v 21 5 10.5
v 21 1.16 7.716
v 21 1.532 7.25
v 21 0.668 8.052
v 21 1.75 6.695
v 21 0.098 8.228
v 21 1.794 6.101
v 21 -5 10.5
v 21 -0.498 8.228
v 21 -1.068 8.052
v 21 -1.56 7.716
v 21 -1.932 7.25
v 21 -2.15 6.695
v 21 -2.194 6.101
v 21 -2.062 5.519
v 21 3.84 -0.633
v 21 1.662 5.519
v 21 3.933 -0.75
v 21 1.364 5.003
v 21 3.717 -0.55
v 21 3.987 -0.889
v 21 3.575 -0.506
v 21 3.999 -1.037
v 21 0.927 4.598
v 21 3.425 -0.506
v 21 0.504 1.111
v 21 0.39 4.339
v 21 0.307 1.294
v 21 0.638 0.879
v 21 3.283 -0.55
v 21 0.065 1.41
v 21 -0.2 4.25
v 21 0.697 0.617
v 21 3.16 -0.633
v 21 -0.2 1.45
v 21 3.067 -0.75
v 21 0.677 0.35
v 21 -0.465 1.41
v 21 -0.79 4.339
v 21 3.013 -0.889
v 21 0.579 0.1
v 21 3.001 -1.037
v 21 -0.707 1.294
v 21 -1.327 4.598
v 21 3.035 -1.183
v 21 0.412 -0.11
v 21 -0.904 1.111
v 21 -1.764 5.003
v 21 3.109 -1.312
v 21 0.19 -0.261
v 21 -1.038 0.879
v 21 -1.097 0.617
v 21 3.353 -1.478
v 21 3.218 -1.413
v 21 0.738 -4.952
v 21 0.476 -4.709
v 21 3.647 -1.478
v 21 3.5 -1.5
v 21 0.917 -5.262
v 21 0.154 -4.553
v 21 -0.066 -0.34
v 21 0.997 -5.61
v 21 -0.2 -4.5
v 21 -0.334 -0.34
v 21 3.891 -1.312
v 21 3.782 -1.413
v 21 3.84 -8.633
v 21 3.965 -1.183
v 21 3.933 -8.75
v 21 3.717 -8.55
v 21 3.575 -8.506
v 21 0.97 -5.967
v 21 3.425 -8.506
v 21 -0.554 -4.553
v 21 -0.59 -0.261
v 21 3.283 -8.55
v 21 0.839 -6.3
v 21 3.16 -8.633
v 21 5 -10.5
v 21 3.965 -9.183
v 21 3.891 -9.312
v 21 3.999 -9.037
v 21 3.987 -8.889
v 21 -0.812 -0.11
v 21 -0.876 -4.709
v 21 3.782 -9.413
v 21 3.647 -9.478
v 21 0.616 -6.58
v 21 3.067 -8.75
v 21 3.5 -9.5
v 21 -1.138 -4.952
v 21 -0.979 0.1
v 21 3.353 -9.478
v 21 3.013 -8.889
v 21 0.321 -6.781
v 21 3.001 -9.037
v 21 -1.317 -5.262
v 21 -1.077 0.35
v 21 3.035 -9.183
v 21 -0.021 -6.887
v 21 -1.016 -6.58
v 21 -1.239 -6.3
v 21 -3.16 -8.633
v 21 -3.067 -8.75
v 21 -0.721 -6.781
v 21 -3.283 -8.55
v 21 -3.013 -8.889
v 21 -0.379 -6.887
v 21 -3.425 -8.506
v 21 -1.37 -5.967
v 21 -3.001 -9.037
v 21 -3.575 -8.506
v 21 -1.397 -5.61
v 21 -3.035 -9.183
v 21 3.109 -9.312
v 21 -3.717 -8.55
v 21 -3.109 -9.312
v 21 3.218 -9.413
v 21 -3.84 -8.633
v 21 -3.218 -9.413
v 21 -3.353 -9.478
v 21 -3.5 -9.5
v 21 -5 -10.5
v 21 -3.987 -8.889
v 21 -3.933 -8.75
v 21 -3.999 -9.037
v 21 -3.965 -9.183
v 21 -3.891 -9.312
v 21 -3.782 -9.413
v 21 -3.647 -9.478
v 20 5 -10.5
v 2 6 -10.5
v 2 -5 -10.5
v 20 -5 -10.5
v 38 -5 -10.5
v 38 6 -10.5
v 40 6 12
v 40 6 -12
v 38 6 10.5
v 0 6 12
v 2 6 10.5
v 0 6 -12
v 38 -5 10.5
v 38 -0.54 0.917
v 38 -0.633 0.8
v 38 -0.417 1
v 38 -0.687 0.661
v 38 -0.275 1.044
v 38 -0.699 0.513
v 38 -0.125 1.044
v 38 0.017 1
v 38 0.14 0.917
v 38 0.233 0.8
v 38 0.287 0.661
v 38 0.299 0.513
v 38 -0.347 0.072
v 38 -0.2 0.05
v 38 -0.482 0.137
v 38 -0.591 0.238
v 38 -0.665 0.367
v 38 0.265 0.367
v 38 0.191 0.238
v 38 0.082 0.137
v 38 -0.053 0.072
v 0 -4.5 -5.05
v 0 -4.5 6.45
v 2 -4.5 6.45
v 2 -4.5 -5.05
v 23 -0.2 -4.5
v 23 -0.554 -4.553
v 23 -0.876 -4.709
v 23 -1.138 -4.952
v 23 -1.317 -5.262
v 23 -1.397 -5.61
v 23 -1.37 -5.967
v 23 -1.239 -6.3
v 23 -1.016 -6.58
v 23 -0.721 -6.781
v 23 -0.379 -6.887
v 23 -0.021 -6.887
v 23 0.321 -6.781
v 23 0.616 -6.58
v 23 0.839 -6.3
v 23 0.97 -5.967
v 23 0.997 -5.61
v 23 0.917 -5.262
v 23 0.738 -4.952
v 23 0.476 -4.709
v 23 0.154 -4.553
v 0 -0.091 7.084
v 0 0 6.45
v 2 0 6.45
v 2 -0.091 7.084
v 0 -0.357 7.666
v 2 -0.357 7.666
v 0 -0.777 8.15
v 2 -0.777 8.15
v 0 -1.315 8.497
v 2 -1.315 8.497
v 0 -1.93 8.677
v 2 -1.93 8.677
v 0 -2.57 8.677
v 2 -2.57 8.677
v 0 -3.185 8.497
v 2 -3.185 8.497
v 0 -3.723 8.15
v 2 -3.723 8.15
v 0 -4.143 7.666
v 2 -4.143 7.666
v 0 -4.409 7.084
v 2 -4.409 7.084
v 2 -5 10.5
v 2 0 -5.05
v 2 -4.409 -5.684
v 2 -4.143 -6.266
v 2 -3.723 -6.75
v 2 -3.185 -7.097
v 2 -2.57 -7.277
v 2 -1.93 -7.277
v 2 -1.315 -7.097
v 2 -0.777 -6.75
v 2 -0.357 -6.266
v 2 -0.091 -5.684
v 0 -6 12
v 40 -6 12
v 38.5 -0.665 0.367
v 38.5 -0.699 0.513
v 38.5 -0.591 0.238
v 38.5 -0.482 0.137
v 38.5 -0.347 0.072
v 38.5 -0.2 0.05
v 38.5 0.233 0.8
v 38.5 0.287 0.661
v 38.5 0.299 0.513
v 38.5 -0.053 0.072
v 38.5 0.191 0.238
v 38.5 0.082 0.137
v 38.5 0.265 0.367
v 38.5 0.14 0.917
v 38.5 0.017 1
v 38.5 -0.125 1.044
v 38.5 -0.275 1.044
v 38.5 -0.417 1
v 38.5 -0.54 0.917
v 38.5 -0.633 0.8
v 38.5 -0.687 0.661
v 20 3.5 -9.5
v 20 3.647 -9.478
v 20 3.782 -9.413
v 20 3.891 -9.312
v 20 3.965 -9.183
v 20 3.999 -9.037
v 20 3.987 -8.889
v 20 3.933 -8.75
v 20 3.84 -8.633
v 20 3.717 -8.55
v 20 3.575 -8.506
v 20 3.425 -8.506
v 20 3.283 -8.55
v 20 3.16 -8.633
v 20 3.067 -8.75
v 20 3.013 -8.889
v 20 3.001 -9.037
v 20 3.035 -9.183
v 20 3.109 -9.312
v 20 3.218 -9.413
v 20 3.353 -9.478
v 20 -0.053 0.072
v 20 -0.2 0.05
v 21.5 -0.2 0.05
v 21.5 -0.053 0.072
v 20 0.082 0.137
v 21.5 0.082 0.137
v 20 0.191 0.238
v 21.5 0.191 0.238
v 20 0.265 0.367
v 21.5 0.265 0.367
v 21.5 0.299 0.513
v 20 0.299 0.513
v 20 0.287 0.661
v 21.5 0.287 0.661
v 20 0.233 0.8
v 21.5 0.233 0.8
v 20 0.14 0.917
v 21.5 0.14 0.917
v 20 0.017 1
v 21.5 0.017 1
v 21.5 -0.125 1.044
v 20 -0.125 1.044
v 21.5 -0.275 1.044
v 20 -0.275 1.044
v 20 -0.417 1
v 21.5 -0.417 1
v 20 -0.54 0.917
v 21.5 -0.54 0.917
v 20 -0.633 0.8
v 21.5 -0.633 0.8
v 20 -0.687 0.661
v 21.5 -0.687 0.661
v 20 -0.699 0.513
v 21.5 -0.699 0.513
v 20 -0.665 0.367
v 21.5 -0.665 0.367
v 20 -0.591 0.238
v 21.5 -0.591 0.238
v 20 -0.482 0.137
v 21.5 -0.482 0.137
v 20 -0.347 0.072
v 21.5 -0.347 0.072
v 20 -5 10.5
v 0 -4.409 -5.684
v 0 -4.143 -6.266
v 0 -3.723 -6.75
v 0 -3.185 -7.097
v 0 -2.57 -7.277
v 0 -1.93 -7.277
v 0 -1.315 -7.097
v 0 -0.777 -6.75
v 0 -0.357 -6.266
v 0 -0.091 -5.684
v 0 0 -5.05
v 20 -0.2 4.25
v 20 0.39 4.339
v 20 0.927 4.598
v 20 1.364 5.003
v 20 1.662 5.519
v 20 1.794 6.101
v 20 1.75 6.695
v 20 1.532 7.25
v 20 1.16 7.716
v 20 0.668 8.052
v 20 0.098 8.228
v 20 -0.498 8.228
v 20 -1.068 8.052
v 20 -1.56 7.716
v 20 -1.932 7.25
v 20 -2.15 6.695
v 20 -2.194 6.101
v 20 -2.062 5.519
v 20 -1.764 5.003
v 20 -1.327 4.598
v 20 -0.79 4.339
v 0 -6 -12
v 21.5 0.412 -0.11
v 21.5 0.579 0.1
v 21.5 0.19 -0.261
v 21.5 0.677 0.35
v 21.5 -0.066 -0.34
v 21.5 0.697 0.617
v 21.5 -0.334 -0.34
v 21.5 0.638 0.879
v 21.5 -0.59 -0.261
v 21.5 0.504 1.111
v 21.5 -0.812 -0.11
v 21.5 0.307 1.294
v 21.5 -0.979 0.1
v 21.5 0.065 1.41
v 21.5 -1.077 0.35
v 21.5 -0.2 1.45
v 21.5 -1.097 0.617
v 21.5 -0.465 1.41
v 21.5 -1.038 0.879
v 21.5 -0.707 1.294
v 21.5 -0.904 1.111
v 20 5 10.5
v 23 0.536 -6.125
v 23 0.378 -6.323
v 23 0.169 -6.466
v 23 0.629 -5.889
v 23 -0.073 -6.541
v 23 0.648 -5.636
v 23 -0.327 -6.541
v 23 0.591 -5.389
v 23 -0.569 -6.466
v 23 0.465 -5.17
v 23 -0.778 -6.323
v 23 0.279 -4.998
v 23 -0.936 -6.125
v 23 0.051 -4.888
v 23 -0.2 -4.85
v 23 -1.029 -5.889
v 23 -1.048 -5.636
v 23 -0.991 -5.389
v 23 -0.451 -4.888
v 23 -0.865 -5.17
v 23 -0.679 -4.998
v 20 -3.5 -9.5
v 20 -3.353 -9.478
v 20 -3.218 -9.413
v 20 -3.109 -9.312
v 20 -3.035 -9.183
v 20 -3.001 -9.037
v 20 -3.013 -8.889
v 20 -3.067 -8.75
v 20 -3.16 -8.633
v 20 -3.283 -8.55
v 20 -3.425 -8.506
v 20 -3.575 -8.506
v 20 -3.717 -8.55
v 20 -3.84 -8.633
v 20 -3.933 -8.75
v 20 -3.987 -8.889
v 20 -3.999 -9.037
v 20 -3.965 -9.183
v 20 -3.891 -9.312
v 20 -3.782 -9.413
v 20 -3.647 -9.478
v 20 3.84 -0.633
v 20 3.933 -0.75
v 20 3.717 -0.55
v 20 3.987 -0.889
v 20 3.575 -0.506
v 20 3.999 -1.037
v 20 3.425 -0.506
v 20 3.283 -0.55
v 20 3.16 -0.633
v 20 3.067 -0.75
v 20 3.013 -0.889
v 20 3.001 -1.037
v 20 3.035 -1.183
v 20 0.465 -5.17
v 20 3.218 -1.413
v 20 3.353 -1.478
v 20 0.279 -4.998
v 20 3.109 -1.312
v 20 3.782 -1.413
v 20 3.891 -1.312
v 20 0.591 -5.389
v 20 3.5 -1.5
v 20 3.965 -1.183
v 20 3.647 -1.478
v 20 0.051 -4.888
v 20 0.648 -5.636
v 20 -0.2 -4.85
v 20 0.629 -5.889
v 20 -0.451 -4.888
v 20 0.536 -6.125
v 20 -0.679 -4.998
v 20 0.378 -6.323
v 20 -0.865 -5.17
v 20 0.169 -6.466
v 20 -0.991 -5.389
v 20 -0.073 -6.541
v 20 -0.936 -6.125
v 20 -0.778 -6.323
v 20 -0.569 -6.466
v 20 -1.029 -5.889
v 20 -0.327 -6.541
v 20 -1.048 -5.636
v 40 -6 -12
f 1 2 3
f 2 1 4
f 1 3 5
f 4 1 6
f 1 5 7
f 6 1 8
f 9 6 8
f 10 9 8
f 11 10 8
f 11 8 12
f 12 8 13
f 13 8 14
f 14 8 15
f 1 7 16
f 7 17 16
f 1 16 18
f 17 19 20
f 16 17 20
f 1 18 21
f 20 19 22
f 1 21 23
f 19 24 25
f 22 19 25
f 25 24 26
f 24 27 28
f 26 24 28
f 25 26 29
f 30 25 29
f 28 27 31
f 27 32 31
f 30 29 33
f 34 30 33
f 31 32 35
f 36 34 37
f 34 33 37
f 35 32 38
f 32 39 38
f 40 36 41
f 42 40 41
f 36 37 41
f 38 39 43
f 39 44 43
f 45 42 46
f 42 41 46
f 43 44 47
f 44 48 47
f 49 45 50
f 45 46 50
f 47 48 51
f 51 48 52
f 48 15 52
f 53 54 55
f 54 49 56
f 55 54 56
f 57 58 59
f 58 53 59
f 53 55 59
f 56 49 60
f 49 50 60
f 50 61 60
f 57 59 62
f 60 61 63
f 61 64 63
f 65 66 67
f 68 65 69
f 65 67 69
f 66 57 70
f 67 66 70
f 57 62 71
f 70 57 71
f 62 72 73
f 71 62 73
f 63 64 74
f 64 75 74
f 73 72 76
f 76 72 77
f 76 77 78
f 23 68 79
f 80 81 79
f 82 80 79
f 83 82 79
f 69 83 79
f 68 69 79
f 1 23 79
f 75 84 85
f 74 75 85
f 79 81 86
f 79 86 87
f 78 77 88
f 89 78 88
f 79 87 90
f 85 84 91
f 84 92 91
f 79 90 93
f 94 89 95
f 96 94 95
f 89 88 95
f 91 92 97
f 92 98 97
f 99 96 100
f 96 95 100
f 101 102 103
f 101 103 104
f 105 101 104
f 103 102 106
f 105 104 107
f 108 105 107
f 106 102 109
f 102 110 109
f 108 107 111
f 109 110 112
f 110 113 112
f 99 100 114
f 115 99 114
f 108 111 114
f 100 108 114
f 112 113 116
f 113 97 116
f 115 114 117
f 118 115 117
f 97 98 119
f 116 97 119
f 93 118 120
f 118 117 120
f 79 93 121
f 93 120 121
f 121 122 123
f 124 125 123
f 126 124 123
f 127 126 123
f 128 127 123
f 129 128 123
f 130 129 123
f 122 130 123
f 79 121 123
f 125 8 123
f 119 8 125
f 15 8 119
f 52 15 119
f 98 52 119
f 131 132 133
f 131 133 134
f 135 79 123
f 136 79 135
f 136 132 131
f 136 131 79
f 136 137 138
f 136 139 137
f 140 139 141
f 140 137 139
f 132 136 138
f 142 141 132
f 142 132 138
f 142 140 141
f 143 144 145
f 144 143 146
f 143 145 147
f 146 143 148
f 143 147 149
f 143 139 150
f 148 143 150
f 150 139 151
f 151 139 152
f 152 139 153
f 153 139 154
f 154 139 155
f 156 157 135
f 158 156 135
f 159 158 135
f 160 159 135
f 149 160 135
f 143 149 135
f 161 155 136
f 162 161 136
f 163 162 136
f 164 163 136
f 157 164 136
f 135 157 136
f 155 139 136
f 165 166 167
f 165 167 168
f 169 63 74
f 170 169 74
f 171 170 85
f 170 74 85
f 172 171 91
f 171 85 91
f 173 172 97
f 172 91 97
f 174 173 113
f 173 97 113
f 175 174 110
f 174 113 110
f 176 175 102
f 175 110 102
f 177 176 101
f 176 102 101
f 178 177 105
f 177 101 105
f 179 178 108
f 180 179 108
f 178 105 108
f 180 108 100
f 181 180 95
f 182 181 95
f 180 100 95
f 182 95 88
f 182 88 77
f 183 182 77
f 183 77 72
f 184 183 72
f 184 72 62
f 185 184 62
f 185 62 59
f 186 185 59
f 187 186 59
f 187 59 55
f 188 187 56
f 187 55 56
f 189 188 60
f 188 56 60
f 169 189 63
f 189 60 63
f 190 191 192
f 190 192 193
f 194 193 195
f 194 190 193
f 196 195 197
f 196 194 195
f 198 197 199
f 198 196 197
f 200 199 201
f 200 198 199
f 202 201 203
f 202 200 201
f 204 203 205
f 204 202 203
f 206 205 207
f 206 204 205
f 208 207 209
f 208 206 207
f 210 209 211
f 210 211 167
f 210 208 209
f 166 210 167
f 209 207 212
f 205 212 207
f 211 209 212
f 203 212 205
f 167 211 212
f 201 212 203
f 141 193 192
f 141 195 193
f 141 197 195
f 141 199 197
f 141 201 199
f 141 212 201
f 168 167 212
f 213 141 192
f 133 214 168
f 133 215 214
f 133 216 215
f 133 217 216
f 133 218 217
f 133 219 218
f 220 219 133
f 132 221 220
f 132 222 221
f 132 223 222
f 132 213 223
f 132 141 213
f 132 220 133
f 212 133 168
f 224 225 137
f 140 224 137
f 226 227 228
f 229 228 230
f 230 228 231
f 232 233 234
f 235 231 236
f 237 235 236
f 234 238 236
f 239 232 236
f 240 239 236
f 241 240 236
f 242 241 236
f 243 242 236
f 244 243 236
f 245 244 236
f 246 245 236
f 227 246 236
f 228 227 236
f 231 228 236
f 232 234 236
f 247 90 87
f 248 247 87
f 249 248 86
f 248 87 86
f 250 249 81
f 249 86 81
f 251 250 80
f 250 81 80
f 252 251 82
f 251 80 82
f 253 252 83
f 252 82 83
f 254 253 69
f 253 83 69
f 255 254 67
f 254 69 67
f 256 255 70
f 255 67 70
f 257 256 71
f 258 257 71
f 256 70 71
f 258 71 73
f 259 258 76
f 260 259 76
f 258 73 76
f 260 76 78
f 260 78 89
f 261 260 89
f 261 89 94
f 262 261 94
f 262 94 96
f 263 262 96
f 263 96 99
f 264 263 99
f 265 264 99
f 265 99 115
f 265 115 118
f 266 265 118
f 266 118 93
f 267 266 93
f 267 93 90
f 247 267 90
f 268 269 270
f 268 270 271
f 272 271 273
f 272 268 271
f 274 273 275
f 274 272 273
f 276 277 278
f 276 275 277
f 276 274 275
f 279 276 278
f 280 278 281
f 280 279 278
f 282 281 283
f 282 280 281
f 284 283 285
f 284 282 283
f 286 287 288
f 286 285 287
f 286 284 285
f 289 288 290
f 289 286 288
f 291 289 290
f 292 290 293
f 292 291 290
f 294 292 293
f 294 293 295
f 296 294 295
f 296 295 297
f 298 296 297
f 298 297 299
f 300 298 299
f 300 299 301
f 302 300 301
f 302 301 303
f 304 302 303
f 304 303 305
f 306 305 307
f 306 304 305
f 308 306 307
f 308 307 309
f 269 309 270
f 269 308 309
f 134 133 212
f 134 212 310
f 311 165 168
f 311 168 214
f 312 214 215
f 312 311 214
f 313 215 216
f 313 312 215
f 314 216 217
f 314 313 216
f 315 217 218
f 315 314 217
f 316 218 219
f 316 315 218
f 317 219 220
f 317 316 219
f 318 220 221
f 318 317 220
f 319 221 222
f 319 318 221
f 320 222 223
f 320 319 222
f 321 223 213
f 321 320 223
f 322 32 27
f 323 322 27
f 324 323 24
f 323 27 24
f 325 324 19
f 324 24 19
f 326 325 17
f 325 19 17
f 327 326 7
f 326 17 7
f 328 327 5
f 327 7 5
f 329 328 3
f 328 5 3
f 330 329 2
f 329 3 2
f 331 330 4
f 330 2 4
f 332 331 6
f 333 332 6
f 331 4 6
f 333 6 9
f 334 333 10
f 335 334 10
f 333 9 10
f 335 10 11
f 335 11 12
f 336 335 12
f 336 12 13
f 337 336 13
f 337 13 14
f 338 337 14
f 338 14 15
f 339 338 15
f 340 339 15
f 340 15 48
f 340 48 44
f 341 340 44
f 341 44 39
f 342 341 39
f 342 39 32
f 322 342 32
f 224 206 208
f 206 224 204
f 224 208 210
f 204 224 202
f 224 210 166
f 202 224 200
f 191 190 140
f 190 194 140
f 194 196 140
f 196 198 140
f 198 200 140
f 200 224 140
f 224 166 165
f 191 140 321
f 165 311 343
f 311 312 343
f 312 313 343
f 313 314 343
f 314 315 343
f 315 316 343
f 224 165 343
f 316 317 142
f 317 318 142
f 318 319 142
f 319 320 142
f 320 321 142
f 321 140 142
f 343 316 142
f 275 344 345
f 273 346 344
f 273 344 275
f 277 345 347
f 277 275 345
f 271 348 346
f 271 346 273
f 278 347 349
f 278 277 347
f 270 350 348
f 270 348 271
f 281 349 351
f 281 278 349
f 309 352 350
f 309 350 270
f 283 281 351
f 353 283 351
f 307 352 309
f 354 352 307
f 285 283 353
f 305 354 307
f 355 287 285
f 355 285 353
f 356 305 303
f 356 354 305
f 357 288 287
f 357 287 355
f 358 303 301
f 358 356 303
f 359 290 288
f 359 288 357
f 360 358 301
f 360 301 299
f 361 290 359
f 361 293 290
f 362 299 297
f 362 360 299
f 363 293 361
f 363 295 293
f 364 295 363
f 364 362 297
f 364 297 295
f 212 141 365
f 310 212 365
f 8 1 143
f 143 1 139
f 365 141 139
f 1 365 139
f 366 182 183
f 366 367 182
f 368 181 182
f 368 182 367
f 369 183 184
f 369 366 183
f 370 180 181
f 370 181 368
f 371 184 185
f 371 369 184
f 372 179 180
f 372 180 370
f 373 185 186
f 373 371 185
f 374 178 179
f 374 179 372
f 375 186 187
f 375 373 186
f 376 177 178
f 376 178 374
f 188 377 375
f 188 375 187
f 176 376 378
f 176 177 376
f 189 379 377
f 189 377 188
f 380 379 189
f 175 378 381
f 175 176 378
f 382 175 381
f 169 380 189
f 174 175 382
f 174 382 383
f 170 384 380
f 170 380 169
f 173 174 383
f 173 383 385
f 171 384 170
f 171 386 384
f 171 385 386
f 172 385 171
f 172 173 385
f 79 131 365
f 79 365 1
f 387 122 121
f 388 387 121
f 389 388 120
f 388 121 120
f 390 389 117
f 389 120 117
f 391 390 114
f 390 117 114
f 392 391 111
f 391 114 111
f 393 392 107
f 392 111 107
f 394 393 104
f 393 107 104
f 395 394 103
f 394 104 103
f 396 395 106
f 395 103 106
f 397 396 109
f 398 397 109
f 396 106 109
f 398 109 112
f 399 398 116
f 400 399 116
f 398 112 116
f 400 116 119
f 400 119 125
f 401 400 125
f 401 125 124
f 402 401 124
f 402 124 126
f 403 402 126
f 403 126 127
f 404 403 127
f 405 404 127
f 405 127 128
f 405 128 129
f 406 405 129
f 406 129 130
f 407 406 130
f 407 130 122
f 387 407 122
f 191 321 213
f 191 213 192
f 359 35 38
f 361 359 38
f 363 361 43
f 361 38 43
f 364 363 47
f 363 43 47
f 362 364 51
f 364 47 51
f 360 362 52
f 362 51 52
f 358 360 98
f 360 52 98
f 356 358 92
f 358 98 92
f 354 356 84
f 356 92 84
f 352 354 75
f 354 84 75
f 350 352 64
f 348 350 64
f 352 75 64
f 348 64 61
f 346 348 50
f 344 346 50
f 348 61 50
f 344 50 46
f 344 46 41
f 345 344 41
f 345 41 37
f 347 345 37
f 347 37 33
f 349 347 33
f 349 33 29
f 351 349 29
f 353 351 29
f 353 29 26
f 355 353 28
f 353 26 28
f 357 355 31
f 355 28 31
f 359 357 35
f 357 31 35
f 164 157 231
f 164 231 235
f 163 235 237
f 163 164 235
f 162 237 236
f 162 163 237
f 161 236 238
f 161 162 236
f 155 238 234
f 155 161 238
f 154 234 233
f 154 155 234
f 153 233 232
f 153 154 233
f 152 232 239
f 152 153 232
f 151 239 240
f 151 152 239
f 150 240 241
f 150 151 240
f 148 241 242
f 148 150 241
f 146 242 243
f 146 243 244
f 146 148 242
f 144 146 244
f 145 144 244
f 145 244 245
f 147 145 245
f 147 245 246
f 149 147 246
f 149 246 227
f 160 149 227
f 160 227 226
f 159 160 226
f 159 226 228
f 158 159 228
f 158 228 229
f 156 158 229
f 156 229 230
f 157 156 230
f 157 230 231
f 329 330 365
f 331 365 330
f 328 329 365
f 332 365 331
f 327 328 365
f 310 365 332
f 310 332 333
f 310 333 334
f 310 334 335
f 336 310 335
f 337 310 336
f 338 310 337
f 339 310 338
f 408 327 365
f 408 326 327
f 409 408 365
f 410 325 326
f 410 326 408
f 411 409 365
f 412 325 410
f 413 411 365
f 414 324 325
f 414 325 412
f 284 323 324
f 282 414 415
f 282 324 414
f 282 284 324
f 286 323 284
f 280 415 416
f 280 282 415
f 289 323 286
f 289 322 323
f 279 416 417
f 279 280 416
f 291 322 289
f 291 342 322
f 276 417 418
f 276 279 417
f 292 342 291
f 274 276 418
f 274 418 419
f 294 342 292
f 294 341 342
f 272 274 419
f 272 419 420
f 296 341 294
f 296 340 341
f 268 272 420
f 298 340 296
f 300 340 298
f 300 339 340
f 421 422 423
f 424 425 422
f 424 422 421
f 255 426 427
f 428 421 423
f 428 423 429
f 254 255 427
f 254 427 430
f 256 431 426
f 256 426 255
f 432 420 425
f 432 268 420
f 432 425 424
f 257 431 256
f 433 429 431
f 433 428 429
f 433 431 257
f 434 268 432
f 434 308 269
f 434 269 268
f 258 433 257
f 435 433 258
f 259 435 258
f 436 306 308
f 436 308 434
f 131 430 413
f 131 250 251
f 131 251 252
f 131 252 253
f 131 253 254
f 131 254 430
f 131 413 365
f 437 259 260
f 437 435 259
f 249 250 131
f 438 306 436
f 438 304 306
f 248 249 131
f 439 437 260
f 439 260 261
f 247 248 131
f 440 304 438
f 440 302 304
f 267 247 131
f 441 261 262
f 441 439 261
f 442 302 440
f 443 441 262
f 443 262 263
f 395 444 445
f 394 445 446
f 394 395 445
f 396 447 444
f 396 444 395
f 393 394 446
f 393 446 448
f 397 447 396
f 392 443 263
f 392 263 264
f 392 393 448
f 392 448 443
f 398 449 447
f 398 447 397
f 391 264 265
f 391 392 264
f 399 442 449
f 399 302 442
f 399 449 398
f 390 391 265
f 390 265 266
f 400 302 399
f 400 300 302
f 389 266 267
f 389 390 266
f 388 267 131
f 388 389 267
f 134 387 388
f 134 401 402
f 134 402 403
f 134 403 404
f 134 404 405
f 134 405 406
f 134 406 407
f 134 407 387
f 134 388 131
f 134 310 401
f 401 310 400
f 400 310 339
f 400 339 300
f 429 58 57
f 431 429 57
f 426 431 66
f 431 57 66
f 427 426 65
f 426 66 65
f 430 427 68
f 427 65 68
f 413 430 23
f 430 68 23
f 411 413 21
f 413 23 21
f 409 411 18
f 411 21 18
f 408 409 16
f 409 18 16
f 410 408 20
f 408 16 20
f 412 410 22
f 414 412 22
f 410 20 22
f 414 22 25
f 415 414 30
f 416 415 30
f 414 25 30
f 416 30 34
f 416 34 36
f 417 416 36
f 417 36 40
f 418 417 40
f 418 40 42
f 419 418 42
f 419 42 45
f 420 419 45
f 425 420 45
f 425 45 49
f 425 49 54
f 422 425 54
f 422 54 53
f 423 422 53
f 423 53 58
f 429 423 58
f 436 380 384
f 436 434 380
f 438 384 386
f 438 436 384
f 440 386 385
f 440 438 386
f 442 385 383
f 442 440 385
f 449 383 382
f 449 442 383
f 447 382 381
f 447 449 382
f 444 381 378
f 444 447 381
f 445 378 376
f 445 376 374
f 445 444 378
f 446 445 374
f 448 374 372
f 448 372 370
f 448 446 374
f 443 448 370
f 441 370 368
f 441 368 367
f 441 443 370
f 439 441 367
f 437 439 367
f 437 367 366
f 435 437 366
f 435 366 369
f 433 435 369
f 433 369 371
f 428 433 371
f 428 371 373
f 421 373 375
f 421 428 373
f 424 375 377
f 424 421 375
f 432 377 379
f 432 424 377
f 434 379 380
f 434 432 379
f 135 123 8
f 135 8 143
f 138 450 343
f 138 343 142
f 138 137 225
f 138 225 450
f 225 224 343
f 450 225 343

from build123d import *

# Parameters (mm, degrees)
SKETCH_2_W               = 24
SKETCH_2_H               = 12
EXTRUDE_1_DEPTH          = 40
SKETCH_3_W               = 36
SKETCH_3_H               = 21
CUT_EXTRUDE_1_DEPTH      = 11
CUT_EXTRUDE_2_DEPTH      = 2
SKETCH_7_W               = 1
SKETCH_7_H               = 21
EXTRUDE_4_DEPTH          = 10
SKETCH_8_R               = 0.85
CUT_EXTRUDE_3_DEPTH      = 3
SKETCH_9_R               = 1.2
EXTRUDE_5_DEPTH          = 2
CUT_EXTRUDE_START        = -2
SKETCH_10_R              = 0.85
CUT_EXTRUDE_4_DEPTH      = 2
SKETCH_11_R              = 0.9
EXTRUDE_6_DEPTH          = 0.5
CUT_EXTRUDE_5_DEPTH      = 17
CUT_EXTRUDE_5_DEPTH_BACK = 2
SKETCH_12_R              = 0.5
SKETCH_13_R              = 2
CUT_EXTRUDE_6_DEPTH      = 2
SKETCH_14_R              = 0.5
CUT_EXTRUDE_7_DEPTH      = 2


with BuildPart() as part:
    # 草图2 → 凸台-拉伸1 (new body)
    with BuildSketch(Plane(origin=(0, 0, 0), x_dir=(0, 0, -1), z_dir=(1, 0, 0))):
        Rectangle(SKETCH_2_W, SKETCH_2_H)
    extrude(amount=EXTRUDE_1_DEPTH)

    # 草图3 → 切除-拉伸1 (cut)
    with BuildSketch(Plane(origin=(0, 6, 0), x_dir=(1, 0, 0), z_dir=(0, 1, 0))):
        with Locations((20, 0)):
            Rectangle(SKETCH_3_W, SKETCH_3_H)
    extrude(amount=-CUT_EXTRUDE_1_DEPTH, mode=Mode.SUBTRACT)

    # 草图4 → 切除-拉伸2 (cut)
    with BuildSketch(Plane.ZY):
        with BuildLine():
            Line((-5.05, 0), (6.45, 0))
            ThreePointArc((6.45, 0), (8.7, -2.25), (6.45, -4.5))
            Line((6.45, -4.5), (-5.05, -4.5))
            ThreePointArc((-5.05, -4.5), (-7.3, -2.25), (-5.05, 0))
        make_face()
    extrude(amount=-CUT_EXTRUDE_2_DEPTH, mode=Mode.SUBTRACT)

    # 草图7 → 凸台-拉伸4 (add)
    with BuildSketch(Plane(origin=(0, -5, 0), x_dir=(1, 0, 0), z_dir=(0, 1, 0))):
        with Locations((20.5, 0)):
            Rectangle(SKETCH_7_W, SKETCH_7_H)
    extrude(amount=EXTRUDE_4_DEPTH)

    # 草图8 → 切除-拉伸3 (cut)
    with BuildSketch(Plane.ZY.offset(-20)):
        with Locations((-5.7, -0.2)):
            Circle(SKETCH_8_R)
    extrude(amount=-CUT_EXTRUDE_3_DEPTH, mode=Mode.SUBTRACT)

    # 草图9 → 凸台-拉伸5 (add)
    with BuildSketch(Plane(origin=(21, 0, 0), x_dir=(0, 0, -1), z_dir=(1, 0, 0))):
        with Locations(Location((5.7, -0.2, 0), (0, 0, 180))):
            Circle(SKETCH_9_R)
    extrude(amount=EXTRUDE_5_DEPTH)

    # 草图10 → 切除-拉伸4 (cut)
    with BuildSketch(Plane(origin=(23, 0, 0), x_dir=(0, 0, -1), z_dir=(1, 0, 0)).offset(CUT_EXTRUDE_START)):
        with Locations(Location((5.7, -0.2, 0), (0, 0, 180))):
            Circle(SKETCH_10_R)
    extrude(amount=CUT_EXTRUDE_4_DEPTH, mode=Mode.SUBTRACT)

    # 草图11 → 凸台-拉伸6 (add)
    with BuildSketch(Plane(origin=(21, 0, 0), x_dir=(0, 0, -1), z_dir=(1, 0, 0))):
        with Locations(Location((-0.55, -0.2, 0), (0, 0, 180))):
            Circle(SKETCH_11_R)
    extrude(amount=EXTRUDE_6_DEPTH)

    # 草图12 → 切除-拉伸5 (cut, two sides: drawn at the far end of the back side and taken through both)
    with BuildSketch(Plane(origin=(21.5, 0, 0), x_dir=(0, 0, -1), z_dir=(1, 0, 0)).offset(-CUT_EXTRUDE_5_DEPTH_BACK)):
        with Locations((-0.55, -0.2)):
            Circle(SKETCH_12_R)
    extrude(amount=CUT_EXTRUDE_5_DEPTH + CUT_EXTRUDE_5_DEPTH_BACK, mode=Mode.SUBTRACT)

    # 草图13 → 切除-拉伸6 (cut)
    with BuildSketch(Plane(origin=(21, 0, 0), x_dir=(0, 0, -1), z_dir=(1, 0, 0))):
        with Locations((-6.25, -0.2)):
            Circle(SKETCH_13_R)
    extrude(amount=-CUT_EXTRUDE_6_DEPTH, mode=Mode.SUBTRACT)

    # 草图14 → 切除-拉伸7 (cut)
    with BuildSketch(Plane(origin=(21, 0, 0), x_dir=(0, 0, -1), z_dir=(1, 0, 0))):
        with Locations((9, -3.5)):
            Circle(SKETCH_14_R)
        with Locations((9, 3.5)):
            Circle(SKETCH_14_R)
        with Locations((1, 3.5)):
            Circle(SKETCH_14_R)
    extrude(amount=-CUT_EXTRUDE_7_DEPTH, mode=Mode.SUBTRACT)


solid = part.part
